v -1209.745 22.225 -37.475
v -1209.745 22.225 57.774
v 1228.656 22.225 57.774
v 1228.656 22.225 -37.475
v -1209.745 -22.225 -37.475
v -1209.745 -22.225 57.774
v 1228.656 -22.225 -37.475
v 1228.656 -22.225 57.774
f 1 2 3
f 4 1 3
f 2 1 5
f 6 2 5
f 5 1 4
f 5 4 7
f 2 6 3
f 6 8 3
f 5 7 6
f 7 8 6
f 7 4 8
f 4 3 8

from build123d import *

# Parameters (mm, degrees)
F0_W     = 2457.3111534119
F0_H     = 115.5486032367
F1_DEPTH = 22.225
F2_DEPTH = 192.93608
F3_DEPTH = 19.177
F4_DEPTH = 0.2667
F5_DEPTH = 12.7
F6_DEPTH = 1.24968
F7_DEPTH = 25.4
F8_DEPTH = 19.05


with BuildPart() as f1:
    # F0 (on Front) → F1 (new body, symmetric)
    with BuildSketch(Plane.XZ):
        Rectangle(F0_W, F0_H)
    extrude(amount=F1_DEPTH, both=True)

    # F2 (add): a face of the model
    f2_faces = [f1.faces().sort_by_distance(p)[0] for p in [
        (-1228.6555767059, 0, 0),
    ]]
    extrude(f2_faces, amount=-F2_DEPTH)

    # F3 (cut): a face of the model
    f3_faces = [f1.faces().sort_by_distance(p)[0] for p in [
        (-1228.6555767059, 0, 0),
    ]]
    extrude(f3_faces, amount=-F3_DEPTH, mode=Mode.SUBTRACT)

    # F4 (add): a face of the model
    f4_faces = [f1.faces().sort_by_distance(p)[0] for p in [
        (-1209.4785767059, 0, 0),
    ]]
    extrude(f4_faces, amount=F4_DEPTH)

    # F5 (cut): a face of the model
    f5_faces = [f1.faces().sort_by_distance(p)[0] for p in [
        (9.45515, 0, -57.7743016183),
    ]]
    extrude(f5_faces, amount=-F5_DEPTH, mode=Mode.SUBTRACT)

    # F6 (cut): a face of the model
    f6_faces = [f1.faces().sort_by_distance(p)[0] for p in [
        (9.45515, 0, -45.0743016183),
    ]]
    extrude(f6_faces, amount=-F6_DEPTH, mode=Mode.SUBTRACT)

    # F7 (cut): a face of the model
    f7_faces = [f1.faces().sort_by_distance(p)[0] for p in [
        (9.45515, 0, -43.8246216183),
    ]]
    extrude(f7_faces, amount=-F7_DEPTH, mode=Mode.SUBTRACT)

    # F8 (add): a face of the model
    f8_faces = [f1.faces().sort_by_distance(p)[0] for p in [
        (9.45515, 0, -18.4246216183),
    ]]
    extrude(f8_faces, amount=F8_DEPTH)


solid = f1.part
